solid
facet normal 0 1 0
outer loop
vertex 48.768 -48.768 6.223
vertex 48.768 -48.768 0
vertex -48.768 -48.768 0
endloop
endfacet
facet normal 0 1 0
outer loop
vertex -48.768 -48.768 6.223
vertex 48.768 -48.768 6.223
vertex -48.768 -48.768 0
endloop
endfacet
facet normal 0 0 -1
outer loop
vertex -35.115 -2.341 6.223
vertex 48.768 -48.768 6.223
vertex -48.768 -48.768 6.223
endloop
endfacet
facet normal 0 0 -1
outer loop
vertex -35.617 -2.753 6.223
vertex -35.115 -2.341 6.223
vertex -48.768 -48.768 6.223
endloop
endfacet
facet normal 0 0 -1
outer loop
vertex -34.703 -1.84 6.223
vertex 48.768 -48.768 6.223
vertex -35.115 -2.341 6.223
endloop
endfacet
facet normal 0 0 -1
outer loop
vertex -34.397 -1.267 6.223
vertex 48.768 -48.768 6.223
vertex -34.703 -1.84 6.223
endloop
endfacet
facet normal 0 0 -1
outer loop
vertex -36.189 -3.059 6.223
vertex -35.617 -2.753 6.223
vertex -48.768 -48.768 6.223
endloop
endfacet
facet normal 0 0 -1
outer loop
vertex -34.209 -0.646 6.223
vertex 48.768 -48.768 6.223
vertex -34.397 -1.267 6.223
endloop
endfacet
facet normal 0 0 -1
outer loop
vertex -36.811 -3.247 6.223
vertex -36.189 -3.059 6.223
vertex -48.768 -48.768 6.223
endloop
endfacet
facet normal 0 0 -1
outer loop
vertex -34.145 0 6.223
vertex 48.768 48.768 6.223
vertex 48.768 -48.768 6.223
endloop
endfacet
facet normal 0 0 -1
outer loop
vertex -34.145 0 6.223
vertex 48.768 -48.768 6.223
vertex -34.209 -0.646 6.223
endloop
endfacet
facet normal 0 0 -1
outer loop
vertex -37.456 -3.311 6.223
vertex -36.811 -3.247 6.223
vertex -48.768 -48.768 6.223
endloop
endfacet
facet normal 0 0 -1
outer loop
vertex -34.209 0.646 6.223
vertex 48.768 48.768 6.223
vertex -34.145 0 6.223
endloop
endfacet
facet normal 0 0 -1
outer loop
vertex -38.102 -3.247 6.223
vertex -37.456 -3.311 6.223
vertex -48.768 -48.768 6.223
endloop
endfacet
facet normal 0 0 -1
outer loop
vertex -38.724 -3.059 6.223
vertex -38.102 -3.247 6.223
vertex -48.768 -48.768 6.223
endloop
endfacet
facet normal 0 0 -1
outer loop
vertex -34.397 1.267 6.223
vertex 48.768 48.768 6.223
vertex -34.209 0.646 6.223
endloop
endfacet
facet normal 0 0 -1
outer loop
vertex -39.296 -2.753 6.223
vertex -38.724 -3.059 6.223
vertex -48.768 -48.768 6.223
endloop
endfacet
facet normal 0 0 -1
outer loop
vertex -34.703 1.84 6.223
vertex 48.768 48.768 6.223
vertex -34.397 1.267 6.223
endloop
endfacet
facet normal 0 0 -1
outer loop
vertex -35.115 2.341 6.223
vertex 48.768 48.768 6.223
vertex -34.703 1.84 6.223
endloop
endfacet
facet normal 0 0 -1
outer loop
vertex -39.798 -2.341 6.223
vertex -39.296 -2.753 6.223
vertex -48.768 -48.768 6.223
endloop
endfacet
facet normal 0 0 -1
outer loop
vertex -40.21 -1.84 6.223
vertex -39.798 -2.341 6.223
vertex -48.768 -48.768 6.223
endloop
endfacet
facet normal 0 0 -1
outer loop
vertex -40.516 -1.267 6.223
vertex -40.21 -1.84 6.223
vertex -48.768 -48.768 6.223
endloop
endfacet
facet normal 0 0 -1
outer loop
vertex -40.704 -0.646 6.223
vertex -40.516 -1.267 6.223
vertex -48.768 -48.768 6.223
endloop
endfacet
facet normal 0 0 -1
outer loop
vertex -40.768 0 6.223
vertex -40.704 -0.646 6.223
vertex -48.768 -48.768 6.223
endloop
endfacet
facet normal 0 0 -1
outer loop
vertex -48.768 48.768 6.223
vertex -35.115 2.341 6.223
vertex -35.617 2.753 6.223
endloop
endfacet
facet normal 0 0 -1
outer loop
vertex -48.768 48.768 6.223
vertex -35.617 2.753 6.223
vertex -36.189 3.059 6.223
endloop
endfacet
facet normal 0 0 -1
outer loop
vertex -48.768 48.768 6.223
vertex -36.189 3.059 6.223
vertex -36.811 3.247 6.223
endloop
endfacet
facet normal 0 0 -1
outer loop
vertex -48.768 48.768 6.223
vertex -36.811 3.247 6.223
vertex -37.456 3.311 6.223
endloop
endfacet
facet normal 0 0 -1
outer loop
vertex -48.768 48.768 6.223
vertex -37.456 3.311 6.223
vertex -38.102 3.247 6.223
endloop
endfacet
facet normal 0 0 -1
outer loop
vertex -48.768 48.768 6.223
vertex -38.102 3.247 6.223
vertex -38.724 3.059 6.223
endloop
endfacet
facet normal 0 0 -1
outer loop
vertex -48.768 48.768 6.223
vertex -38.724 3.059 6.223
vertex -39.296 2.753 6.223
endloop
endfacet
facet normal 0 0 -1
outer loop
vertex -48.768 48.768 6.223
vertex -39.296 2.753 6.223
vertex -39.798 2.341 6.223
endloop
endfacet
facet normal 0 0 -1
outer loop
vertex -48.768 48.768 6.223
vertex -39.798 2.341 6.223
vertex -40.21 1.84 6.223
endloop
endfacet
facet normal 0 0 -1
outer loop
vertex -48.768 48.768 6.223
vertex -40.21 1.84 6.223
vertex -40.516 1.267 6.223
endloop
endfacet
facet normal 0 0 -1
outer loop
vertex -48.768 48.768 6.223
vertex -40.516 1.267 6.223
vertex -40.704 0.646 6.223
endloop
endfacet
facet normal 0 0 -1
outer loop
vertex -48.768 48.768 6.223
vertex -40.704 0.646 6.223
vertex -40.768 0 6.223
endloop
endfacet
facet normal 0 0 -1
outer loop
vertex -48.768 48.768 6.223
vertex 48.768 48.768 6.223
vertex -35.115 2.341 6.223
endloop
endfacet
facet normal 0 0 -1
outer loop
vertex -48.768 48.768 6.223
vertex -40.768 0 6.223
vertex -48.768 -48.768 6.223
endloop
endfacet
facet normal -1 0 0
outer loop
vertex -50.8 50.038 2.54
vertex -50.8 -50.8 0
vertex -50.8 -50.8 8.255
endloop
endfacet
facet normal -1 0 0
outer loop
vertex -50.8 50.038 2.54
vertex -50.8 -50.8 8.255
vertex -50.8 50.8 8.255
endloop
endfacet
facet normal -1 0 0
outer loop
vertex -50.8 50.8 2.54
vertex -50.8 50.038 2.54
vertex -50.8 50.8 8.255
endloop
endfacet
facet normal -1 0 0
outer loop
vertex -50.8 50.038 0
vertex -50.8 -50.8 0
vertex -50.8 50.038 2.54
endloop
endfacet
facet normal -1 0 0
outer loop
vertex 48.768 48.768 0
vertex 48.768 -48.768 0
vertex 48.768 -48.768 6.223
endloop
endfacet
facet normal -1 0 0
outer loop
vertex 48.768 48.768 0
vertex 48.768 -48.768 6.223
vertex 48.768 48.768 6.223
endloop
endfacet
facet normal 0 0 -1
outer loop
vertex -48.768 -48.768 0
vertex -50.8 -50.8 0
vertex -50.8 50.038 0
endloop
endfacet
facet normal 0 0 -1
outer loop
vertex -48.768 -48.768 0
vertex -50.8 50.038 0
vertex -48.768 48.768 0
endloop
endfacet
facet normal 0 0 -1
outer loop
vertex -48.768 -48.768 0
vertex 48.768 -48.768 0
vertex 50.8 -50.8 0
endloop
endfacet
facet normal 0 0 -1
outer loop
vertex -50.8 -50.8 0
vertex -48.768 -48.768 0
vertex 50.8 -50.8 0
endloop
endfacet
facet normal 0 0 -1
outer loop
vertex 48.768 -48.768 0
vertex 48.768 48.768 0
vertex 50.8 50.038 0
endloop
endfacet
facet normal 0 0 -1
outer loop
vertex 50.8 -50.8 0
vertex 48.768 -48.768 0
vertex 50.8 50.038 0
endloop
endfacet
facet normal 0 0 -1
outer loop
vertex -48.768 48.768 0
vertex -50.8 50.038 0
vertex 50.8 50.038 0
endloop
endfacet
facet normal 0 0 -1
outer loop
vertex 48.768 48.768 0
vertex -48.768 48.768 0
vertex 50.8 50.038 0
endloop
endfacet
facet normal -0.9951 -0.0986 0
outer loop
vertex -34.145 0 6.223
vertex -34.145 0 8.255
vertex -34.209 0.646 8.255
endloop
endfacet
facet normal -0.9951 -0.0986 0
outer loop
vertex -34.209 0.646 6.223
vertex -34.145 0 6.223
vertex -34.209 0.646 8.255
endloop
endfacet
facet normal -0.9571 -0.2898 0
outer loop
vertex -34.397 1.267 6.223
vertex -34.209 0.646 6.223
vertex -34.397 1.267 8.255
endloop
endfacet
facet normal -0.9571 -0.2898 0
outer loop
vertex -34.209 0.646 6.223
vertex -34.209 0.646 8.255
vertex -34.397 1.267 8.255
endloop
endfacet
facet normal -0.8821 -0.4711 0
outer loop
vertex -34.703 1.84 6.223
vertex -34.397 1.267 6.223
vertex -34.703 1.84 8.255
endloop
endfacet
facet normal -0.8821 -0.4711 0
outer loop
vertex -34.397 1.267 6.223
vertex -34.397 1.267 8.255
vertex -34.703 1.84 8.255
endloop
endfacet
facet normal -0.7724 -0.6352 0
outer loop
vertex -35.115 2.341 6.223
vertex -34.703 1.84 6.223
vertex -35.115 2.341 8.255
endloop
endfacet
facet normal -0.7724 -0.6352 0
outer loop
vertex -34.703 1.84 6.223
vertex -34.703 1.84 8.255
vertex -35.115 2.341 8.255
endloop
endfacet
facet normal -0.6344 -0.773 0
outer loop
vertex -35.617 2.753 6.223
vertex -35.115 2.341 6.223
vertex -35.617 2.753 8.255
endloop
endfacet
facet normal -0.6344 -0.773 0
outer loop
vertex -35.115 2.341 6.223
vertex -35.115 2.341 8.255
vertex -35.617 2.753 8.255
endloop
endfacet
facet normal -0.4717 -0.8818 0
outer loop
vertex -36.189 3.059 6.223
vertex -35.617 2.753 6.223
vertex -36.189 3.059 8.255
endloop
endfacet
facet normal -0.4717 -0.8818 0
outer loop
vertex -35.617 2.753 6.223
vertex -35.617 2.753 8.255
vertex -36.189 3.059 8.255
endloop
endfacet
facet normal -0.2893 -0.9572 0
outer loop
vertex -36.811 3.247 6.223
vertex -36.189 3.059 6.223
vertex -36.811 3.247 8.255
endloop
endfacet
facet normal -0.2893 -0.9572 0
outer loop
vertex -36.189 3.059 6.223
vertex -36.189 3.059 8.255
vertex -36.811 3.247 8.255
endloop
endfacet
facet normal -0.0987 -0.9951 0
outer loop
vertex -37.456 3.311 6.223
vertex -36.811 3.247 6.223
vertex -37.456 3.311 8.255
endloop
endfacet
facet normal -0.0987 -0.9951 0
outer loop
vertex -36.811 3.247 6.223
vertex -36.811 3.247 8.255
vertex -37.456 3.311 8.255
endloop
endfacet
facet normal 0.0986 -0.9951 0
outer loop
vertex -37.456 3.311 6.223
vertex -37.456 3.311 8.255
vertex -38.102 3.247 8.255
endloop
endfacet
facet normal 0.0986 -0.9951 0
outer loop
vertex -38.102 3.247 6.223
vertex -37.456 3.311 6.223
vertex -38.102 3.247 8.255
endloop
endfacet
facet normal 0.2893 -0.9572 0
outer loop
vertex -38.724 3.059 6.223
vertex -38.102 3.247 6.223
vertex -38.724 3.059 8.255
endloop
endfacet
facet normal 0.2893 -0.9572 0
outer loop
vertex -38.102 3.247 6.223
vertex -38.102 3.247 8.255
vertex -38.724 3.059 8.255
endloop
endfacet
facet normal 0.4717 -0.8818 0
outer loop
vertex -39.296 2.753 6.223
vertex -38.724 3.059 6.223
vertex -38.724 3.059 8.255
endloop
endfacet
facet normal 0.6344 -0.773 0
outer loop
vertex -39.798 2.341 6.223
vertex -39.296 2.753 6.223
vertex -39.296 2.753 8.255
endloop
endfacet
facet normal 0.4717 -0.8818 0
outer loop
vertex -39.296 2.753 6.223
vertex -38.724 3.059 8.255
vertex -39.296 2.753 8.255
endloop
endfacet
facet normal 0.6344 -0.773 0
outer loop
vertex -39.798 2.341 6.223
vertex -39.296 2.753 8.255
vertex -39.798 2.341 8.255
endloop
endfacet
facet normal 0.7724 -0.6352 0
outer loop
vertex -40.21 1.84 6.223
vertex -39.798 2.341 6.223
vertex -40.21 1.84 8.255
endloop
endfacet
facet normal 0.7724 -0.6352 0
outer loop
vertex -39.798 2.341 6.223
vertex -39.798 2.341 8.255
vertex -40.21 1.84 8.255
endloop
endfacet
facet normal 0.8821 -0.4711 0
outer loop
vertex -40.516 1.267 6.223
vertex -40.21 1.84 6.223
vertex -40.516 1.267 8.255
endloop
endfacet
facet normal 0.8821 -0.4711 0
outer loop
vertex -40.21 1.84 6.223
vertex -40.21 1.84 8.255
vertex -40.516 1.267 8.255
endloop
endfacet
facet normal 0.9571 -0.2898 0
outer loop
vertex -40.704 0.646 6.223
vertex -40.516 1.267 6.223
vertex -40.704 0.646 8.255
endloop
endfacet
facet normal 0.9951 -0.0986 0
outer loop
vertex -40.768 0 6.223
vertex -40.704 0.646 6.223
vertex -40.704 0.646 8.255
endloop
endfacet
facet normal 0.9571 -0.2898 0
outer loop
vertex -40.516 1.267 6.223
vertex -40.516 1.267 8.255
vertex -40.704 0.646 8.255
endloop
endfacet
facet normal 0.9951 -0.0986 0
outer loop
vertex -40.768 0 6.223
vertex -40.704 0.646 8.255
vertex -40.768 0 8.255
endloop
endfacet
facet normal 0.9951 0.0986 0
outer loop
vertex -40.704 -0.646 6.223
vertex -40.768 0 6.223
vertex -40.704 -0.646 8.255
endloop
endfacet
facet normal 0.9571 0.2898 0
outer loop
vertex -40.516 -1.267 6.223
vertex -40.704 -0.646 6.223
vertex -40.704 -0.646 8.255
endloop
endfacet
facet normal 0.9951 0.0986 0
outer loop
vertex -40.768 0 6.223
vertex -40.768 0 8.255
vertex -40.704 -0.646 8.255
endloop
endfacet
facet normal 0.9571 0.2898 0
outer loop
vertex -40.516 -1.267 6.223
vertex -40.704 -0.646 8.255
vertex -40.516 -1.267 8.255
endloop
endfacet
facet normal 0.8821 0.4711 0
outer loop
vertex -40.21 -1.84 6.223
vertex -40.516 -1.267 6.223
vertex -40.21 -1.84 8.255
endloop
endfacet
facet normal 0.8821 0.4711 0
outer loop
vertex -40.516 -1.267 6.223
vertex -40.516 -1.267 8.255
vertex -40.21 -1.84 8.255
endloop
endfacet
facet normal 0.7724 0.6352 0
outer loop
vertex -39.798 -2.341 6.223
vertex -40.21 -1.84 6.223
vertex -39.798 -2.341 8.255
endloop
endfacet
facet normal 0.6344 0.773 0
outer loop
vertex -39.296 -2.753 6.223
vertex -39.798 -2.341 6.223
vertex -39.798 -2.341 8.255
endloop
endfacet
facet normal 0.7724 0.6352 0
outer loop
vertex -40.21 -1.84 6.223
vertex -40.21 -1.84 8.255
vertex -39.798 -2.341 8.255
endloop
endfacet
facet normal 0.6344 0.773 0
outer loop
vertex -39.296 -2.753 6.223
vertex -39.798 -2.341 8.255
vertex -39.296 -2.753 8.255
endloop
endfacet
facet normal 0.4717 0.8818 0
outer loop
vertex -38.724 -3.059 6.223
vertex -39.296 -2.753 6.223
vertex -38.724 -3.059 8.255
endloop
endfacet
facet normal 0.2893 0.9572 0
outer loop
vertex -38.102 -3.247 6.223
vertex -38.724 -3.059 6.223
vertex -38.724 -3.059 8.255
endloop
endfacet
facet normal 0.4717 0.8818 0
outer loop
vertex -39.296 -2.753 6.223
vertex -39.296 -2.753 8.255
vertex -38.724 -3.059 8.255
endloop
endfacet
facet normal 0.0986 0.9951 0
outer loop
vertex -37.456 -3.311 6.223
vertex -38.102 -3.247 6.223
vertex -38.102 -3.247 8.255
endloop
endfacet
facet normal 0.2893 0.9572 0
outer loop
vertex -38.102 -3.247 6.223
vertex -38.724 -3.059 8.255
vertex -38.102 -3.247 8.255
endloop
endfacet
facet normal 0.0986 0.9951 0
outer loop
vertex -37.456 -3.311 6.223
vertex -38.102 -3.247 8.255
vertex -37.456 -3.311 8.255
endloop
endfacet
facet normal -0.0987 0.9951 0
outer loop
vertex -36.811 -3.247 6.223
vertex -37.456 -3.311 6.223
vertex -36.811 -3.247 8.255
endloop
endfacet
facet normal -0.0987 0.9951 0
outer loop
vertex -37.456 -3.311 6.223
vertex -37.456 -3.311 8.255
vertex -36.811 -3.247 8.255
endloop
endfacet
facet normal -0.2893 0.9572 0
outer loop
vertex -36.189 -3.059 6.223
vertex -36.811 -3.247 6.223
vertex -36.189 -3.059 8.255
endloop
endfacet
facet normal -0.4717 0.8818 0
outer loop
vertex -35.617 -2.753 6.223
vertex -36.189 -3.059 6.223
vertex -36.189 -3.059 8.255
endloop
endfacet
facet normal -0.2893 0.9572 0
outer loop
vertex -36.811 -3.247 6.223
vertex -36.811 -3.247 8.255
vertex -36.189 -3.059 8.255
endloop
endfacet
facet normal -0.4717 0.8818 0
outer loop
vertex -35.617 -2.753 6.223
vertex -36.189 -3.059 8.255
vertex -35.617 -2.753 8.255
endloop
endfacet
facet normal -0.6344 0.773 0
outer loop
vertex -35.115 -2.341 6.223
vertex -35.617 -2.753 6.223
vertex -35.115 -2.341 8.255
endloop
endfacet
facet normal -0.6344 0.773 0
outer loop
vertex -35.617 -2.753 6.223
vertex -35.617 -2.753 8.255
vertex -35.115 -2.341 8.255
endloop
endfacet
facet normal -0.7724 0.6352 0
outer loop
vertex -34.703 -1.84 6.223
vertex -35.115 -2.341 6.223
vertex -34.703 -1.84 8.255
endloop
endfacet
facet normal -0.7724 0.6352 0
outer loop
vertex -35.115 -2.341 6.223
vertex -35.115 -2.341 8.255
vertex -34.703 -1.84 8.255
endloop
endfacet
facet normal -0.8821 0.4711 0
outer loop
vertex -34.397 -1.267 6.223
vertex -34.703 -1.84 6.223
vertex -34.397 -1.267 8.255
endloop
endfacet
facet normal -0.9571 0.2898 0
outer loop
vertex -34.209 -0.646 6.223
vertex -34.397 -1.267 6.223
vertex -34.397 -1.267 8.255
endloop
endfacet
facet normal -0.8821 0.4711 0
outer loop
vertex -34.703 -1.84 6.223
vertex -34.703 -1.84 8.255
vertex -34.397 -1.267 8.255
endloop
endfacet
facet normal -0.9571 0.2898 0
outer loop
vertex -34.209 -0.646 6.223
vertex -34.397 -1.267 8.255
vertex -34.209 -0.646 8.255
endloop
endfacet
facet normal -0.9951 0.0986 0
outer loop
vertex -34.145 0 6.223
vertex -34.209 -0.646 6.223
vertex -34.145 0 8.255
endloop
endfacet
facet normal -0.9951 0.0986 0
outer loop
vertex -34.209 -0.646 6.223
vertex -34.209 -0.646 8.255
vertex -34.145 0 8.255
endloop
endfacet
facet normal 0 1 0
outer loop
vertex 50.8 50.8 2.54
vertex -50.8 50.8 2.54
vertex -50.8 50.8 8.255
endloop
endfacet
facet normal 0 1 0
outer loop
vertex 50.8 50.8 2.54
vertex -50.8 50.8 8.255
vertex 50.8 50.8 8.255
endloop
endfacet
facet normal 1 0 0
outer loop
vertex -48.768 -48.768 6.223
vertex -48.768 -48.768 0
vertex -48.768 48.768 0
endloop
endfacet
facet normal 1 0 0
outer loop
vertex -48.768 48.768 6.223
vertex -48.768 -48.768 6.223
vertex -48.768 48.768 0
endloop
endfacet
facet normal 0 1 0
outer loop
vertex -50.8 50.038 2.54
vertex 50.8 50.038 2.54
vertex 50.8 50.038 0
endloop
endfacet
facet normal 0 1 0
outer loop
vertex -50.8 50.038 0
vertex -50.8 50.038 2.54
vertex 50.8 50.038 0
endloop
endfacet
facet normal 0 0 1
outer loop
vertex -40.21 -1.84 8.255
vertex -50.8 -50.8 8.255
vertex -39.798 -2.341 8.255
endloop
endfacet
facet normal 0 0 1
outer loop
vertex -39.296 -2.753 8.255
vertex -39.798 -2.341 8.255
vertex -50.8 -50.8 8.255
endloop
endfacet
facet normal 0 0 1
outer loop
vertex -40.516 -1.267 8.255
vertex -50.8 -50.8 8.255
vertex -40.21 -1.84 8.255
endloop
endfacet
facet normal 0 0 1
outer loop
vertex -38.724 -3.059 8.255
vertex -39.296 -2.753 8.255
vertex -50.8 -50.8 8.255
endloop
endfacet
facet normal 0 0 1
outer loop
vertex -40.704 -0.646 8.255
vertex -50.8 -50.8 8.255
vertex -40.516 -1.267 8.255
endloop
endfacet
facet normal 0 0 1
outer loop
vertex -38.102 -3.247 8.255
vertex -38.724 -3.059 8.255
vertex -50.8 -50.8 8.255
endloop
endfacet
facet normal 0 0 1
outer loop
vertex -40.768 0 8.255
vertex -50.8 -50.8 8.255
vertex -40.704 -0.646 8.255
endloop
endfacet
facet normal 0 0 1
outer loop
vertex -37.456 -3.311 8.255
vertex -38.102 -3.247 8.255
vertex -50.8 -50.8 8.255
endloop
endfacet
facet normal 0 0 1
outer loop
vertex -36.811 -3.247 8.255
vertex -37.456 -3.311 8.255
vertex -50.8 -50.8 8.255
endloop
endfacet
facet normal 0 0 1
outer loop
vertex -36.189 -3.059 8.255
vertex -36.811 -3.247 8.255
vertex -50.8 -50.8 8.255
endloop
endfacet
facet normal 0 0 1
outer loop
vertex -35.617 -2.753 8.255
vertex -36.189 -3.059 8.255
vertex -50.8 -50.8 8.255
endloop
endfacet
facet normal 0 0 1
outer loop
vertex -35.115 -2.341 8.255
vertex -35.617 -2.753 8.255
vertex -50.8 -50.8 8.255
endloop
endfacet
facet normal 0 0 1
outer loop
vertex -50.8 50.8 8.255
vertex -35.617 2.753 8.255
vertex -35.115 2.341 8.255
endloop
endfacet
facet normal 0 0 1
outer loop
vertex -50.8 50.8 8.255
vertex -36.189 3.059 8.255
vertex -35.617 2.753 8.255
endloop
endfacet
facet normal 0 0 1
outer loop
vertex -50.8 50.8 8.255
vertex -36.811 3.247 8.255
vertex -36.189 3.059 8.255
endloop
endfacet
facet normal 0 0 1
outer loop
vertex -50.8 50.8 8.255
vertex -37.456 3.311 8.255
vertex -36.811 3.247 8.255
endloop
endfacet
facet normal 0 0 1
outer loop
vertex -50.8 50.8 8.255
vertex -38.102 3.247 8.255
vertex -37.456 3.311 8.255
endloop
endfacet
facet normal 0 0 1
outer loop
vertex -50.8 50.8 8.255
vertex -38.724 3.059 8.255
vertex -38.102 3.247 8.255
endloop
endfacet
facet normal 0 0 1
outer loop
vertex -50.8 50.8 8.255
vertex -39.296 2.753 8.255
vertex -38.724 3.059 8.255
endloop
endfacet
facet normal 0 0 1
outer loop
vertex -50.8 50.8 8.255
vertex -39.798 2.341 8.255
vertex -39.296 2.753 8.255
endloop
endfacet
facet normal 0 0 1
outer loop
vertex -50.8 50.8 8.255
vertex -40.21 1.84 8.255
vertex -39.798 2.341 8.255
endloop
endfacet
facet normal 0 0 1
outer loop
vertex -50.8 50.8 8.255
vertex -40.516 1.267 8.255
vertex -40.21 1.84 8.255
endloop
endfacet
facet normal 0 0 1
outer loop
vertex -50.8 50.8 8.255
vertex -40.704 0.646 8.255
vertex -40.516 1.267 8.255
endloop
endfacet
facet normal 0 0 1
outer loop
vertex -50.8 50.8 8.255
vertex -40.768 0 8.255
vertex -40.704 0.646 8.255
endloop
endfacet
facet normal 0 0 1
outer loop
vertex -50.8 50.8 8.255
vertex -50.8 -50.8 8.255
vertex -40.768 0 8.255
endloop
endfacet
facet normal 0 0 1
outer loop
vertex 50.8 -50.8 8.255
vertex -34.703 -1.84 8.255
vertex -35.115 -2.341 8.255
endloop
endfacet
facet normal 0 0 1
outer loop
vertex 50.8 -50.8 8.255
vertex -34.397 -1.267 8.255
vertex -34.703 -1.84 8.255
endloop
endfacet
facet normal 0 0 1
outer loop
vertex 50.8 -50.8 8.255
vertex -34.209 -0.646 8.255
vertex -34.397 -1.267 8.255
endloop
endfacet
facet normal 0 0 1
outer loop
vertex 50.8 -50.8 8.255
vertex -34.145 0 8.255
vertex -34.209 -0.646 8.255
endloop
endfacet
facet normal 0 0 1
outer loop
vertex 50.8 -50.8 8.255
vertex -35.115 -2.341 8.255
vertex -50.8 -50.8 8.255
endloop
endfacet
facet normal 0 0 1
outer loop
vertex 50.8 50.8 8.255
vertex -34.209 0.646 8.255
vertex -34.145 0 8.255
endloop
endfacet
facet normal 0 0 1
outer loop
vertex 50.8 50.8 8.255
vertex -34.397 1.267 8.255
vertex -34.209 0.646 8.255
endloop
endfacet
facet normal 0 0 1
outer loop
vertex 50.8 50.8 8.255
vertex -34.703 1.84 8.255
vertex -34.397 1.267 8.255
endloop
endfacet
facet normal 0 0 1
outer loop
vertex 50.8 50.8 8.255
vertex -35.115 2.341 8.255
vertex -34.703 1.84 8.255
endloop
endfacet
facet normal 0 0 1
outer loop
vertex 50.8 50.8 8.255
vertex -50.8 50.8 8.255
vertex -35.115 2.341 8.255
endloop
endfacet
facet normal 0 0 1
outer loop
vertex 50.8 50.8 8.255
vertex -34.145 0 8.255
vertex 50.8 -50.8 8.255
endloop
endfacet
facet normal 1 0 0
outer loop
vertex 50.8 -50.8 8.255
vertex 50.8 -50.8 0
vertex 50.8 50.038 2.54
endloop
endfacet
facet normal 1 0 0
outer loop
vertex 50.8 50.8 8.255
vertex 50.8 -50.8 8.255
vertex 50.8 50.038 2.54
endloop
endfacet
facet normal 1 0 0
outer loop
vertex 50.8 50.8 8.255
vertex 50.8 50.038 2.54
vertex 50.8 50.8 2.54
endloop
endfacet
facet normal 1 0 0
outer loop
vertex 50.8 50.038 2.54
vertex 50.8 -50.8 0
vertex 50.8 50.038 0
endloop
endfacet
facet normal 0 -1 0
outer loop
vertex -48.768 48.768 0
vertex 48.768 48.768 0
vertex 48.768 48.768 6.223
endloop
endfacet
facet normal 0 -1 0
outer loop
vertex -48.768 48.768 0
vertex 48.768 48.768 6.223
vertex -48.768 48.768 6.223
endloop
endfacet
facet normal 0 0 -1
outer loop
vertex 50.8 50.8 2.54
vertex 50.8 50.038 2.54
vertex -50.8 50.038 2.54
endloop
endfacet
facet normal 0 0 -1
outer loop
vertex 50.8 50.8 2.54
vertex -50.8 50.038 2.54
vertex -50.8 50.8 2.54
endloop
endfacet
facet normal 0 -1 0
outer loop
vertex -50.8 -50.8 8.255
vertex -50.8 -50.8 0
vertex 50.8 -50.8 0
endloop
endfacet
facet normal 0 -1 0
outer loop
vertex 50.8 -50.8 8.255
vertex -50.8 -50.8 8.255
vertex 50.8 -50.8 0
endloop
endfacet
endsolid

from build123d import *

# Parameters (mm, degrees)
SKETCH2_W           = 101.6
SKETCH2_H           = 101.6
BOSS_EXTRUDE1_DEPTH = 8.255
SKETCH3_W           = 97.536
SKETCH3_H           = 97.536
CUT_EXTRUDE1_DEPTH  = 6.223
SKETCH4_R           = 3.311109117
CUT_EXTRUDE2_DEPTH  = 2.032
SKETCH8_W           = 2.54
SKETCH8_H           = 0.762
CUT_EXTRUDE3_DEPTH  = 114.891812809


with BuildPart() as part:
    # Sketch2 → Boss-Extrude1 (new body)
    with BuildSketch(Plane.XY):
        Rectangle(SKETCH2_W, SKETCH2_H)
    extrude(amount=BOSS_EXTRUDE1_DEPTH)

    # Sketch3 → Cut-Extrude1 (cut)
    with BuildSketch(Plane(origin=(0, 0, 0), x_dir=(-1, 0, 0), z_dir=(0, 0, -1))):
        Rectangle(SKETCH3_W, SKETCH3_H)
    extrude(amount=-CUT_EXTRUDE1_DEPTH, mode=Mode.SUBTRACT)

    # Sketch4 → Cut-Extrude2 (cut)
    with BuildSketch(Plane.XY.offset(8.255)):
        with Locations((-37.456490902, 0)):
            Circle(SKETCH4_R)
    extrude(amount=-CUT_EXTRUDE2_DEPTH, mode=Mode.SUBTRACT)

    # Sketch8 → Cut-Extrude3 (cut, through all)
    with BuildSketch(Plane(origin=(50.8, 0, 0), x_dir=(0, 0, -1), z_dir=(1, 0, 0))):
        with Locations((-1.27, 50.419)):
            Rectangle(SKETCH8_W, SKETCH8_H)
    extrude(amount=-CUT_EXTRUDE3_DEPTH, mode=Mode.SUBTRACT)


solid = part.part
